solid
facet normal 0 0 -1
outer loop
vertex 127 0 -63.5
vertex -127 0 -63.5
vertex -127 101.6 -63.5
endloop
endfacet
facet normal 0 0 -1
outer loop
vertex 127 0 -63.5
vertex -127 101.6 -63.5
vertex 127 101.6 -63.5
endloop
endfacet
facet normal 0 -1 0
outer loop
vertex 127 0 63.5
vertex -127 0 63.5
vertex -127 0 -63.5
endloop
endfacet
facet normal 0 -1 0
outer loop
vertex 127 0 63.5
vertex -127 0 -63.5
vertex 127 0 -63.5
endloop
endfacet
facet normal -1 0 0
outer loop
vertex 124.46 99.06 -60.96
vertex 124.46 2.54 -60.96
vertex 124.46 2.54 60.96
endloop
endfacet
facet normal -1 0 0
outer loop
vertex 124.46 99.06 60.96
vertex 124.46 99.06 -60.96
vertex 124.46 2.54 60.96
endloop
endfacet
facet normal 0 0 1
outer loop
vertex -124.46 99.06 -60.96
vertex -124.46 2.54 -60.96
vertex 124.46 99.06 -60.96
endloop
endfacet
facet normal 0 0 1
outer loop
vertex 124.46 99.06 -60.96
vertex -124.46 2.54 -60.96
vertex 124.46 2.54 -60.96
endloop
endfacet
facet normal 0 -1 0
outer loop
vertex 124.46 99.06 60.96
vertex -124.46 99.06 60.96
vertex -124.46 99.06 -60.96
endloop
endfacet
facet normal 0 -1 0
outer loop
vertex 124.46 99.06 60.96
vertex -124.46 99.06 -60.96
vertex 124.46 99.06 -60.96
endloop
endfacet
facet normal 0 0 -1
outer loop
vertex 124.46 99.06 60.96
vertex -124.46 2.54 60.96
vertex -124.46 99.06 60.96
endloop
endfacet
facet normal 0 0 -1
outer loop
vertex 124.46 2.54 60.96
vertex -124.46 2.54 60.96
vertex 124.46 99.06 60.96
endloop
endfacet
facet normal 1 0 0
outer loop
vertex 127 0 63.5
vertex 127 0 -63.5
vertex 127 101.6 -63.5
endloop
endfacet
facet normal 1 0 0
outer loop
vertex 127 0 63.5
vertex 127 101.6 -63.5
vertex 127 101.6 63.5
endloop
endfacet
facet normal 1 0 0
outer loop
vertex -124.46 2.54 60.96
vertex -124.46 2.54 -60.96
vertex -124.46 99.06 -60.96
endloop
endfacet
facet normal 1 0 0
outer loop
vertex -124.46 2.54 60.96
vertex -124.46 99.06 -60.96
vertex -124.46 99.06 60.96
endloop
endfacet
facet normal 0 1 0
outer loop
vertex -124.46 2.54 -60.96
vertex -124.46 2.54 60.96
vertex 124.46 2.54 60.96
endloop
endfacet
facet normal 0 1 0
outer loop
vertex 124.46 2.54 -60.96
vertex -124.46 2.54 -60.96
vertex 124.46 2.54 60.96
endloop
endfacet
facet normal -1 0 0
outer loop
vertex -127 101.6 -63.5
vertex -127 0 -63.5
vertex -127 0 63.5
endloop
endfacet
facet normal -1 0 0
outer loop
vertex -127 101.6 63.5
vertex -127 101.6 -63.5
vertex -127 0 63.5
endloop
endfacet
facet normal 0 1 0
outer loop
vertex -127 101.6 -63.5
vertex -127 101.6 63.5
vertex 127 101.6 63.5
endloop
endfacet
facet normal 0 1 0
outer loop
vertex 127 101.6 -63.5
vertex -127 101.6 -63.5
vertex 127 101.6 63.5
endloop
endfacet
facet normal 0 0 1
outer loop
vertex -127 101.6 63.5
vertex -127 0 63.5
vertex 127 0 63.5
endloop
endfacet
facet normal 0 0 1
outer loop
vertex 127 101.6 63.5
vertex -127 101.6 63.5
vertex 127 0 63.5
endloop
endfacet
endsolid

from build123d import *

# Parameters (mm, degrees)
F0_W     = 254
F0_H     = 127
F1_DEPTH = 101.6
F2_T     = -2.54
F3_W     = 248.92
F3_H     = 121.92
F4_DEPTH = 2.54


with BuildPart() as f1:
    # F0 (on Front) → F1 (new body)
    with BuildSketch(Plane.XZ):
        Rectangle(F0_W, F0_H)
    extrude(amount=-F1_DEPTH)

    # F2
    f2_openings = [f1.faces().sort_by_distance(p)[0] for p in [
        (0, 0, 0),
    ]]
    offset(amount=F2_T, openings=f2_openings)

    # F3 (on face) → F4 (join)
    with BuildSketch(Plane.XZ):
        Rectangle(F3_W, F3_H)
    extrude(amount=-F4_DEPTH)


solid = f1.part
